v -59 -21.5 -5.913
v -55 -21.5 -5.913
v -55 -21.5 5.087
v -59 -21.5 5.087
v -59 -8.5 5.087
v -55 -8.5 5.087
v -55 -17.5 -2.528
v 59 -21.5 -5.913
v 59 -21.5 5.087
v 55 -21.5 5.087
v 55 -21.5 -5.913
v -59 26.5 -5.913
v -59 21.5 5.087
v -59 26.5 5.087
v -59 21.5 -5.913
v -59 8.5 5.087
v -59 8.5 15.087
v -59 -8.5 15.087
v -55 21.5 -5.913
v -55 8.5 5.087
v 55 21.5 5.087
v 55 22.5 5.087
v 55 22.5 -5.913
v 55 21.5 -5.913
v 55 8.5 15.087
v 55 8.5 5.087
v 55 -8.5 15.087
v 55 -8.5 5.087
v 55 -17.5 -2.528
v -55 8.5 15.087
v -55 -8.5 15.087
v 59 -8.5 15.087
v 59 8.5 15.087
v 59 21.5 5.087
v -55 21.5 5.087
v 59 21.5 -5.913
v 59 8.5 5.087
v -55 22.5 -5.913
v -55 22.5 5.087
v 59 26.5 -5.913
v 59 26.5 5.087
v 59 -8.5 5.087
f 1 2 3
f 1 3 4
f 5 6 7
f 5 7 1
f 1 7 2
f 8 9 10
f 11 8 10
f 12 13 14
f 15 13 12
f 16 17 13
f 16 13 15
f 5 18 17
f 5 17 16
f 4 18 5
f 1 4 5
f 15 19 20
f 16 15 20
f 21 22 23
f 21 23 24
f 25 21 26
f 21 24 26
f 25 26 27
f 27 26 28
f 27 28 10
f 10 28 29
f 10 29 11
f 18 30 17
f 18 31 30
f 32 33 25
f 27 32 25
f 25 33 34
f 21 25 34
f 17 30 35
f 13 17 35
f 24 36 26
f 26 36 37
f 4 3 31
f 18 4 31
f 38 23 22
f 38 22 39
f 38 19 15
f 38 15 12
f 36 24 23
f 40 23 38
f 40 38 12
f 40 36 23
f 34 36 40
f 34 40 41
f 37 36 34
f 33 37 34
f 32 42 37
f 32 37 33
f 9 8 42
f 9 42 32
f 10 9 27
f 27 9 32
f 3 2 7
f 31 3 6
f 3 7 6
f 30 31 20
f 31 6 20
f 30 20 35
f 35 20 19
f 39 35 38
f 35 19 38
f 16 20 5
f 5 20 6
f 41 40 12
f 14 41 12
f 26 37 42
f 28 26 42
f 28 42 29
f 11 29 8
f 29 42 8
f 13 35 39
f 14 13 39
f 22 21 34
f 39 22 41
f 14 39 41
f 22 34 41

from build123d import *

# Parameters (mm, degrees)
F0_W      = 110
F0_H      = 44
F1_DEPTH  = 21
F4_W      = 43
F4_H      = 21
F5_DEPTH  = 118
F6_DEPTH  = 10
F7_DEPTH  = 5
F9_T      = -4
F10_DEPTH = 25.4
F8_W      = 5
F8_H      = 10
F11_DEPTH = 254
F12_DEPTH = 25.4
F13_W     = 110
F13_H     = 5.2398111895
F14_DEPTH = 25.4


with BuildPart() as f1:
    # F0 (on Top) → F1 (new body)
    with BuildSketch(Plane.XY):
        Rectangle(F0_W, F0_H)
    extrude(amount=F1_DEPTH)


with BuildPart() as f5:
    # F4 (on offset) → F5 (new body)
    with BuildSketch(Plane.YZ.offset(59)):
        with Locations((0, -5.4130828939)):
            Rectangle(F4_W, F4_H)
    extrude(amount=-F5_DEPTH)

    # F6 (add): a face of the model
    f6_faces = [f5.faces().sort_by_distance(p)[0] for p in [
        (0, 0, 5.0869171061),
    ]]
    extrude(f6_faces, amount=F6_DEPTH)

    # F7 (add): a face of the model
    f7_faces = [f5.faces().sort_by_distance(p)[0] for p in [
        (0, 21.5, -0.4130828939),
    ]]
    extrude(f7_faces, amount=F7_DEPTH)

    # F9
    f9_openings = [f5.faces().sort_by_distance(p)[0] for p in [
        (0, 2.5, -15.913083),
    ]]
    offset(amount=F9_T, openings=f9_openings)

    # F10 (cut): a face of the model
    f10_faces = [f5.faces().sort_by_distance(p)[0] for p in [
        (0, 2.5, 11.0869171061),
    ]]
    extrude(f10_faces, amount=-F10_DEPTH, mode=Mode.SUBTRACT)

    # F8 (on face) → F11 (cut)
    with BuildSketch(Plane.YZ.offset(59)):
        Polygon((0, 5.0869171061), (0, -5.9130828939), (21.5, -5.9130828939), (8.5, 5.0869171061), align=None)
        Polygon((-21.5, -5.9130828939), (-21.5, -15.9130828939), (21.5, -15.9130828939), (21.5, -5.9130828939), (0, -5.9130828939), align=None)
        with Locations((24, -10.9130828939)):
            Rectangle(F8_W, F8_H)
        Polygon((26.5, 15.0869171061), (8.5, 15.0869171061), (21.5, 5.0869171061), (26.5, 5.0869171061), align=None)
        Polygon((-8.5, 5.0869171061), (-21.5, -5.9130828939), (0, -5.9130828939), (0, 5.0869171061), align=None)
        Polygon((-21.5, 15.0869171061), (-21.5, 5.0869171061), (-8.5, 15.0869171061), align=None)
    extrude(amount=-F11_DEPTH, mode=Mode.SUBTRACT)

    # F12 (cut): a face of the model
    f12_faces = [f5.faces().sort_by_distance(p)[0] for p in [
        (0, -17.5, 2.8176863368),
    ]]
    extrude(f12_faces, amount=-F12_DEPTH, mode=Mode.SUBTRACT)

    # F13 (on face) → F14 (cut)
    with BuildSketch(Plane(origin=(0, -6.0549280902, 7.1558241066), x_dir=(1, 0, 0), z_dir=(0, 0.6459422415, -0.7633862854))):
        with Locations((0, 17.6124095592)):
            Rectangle(F13_W, F13_H)
    extrude(amount=-F14_DEPTH, mode=Mode.SUBTRACT)


solid = f5.part
